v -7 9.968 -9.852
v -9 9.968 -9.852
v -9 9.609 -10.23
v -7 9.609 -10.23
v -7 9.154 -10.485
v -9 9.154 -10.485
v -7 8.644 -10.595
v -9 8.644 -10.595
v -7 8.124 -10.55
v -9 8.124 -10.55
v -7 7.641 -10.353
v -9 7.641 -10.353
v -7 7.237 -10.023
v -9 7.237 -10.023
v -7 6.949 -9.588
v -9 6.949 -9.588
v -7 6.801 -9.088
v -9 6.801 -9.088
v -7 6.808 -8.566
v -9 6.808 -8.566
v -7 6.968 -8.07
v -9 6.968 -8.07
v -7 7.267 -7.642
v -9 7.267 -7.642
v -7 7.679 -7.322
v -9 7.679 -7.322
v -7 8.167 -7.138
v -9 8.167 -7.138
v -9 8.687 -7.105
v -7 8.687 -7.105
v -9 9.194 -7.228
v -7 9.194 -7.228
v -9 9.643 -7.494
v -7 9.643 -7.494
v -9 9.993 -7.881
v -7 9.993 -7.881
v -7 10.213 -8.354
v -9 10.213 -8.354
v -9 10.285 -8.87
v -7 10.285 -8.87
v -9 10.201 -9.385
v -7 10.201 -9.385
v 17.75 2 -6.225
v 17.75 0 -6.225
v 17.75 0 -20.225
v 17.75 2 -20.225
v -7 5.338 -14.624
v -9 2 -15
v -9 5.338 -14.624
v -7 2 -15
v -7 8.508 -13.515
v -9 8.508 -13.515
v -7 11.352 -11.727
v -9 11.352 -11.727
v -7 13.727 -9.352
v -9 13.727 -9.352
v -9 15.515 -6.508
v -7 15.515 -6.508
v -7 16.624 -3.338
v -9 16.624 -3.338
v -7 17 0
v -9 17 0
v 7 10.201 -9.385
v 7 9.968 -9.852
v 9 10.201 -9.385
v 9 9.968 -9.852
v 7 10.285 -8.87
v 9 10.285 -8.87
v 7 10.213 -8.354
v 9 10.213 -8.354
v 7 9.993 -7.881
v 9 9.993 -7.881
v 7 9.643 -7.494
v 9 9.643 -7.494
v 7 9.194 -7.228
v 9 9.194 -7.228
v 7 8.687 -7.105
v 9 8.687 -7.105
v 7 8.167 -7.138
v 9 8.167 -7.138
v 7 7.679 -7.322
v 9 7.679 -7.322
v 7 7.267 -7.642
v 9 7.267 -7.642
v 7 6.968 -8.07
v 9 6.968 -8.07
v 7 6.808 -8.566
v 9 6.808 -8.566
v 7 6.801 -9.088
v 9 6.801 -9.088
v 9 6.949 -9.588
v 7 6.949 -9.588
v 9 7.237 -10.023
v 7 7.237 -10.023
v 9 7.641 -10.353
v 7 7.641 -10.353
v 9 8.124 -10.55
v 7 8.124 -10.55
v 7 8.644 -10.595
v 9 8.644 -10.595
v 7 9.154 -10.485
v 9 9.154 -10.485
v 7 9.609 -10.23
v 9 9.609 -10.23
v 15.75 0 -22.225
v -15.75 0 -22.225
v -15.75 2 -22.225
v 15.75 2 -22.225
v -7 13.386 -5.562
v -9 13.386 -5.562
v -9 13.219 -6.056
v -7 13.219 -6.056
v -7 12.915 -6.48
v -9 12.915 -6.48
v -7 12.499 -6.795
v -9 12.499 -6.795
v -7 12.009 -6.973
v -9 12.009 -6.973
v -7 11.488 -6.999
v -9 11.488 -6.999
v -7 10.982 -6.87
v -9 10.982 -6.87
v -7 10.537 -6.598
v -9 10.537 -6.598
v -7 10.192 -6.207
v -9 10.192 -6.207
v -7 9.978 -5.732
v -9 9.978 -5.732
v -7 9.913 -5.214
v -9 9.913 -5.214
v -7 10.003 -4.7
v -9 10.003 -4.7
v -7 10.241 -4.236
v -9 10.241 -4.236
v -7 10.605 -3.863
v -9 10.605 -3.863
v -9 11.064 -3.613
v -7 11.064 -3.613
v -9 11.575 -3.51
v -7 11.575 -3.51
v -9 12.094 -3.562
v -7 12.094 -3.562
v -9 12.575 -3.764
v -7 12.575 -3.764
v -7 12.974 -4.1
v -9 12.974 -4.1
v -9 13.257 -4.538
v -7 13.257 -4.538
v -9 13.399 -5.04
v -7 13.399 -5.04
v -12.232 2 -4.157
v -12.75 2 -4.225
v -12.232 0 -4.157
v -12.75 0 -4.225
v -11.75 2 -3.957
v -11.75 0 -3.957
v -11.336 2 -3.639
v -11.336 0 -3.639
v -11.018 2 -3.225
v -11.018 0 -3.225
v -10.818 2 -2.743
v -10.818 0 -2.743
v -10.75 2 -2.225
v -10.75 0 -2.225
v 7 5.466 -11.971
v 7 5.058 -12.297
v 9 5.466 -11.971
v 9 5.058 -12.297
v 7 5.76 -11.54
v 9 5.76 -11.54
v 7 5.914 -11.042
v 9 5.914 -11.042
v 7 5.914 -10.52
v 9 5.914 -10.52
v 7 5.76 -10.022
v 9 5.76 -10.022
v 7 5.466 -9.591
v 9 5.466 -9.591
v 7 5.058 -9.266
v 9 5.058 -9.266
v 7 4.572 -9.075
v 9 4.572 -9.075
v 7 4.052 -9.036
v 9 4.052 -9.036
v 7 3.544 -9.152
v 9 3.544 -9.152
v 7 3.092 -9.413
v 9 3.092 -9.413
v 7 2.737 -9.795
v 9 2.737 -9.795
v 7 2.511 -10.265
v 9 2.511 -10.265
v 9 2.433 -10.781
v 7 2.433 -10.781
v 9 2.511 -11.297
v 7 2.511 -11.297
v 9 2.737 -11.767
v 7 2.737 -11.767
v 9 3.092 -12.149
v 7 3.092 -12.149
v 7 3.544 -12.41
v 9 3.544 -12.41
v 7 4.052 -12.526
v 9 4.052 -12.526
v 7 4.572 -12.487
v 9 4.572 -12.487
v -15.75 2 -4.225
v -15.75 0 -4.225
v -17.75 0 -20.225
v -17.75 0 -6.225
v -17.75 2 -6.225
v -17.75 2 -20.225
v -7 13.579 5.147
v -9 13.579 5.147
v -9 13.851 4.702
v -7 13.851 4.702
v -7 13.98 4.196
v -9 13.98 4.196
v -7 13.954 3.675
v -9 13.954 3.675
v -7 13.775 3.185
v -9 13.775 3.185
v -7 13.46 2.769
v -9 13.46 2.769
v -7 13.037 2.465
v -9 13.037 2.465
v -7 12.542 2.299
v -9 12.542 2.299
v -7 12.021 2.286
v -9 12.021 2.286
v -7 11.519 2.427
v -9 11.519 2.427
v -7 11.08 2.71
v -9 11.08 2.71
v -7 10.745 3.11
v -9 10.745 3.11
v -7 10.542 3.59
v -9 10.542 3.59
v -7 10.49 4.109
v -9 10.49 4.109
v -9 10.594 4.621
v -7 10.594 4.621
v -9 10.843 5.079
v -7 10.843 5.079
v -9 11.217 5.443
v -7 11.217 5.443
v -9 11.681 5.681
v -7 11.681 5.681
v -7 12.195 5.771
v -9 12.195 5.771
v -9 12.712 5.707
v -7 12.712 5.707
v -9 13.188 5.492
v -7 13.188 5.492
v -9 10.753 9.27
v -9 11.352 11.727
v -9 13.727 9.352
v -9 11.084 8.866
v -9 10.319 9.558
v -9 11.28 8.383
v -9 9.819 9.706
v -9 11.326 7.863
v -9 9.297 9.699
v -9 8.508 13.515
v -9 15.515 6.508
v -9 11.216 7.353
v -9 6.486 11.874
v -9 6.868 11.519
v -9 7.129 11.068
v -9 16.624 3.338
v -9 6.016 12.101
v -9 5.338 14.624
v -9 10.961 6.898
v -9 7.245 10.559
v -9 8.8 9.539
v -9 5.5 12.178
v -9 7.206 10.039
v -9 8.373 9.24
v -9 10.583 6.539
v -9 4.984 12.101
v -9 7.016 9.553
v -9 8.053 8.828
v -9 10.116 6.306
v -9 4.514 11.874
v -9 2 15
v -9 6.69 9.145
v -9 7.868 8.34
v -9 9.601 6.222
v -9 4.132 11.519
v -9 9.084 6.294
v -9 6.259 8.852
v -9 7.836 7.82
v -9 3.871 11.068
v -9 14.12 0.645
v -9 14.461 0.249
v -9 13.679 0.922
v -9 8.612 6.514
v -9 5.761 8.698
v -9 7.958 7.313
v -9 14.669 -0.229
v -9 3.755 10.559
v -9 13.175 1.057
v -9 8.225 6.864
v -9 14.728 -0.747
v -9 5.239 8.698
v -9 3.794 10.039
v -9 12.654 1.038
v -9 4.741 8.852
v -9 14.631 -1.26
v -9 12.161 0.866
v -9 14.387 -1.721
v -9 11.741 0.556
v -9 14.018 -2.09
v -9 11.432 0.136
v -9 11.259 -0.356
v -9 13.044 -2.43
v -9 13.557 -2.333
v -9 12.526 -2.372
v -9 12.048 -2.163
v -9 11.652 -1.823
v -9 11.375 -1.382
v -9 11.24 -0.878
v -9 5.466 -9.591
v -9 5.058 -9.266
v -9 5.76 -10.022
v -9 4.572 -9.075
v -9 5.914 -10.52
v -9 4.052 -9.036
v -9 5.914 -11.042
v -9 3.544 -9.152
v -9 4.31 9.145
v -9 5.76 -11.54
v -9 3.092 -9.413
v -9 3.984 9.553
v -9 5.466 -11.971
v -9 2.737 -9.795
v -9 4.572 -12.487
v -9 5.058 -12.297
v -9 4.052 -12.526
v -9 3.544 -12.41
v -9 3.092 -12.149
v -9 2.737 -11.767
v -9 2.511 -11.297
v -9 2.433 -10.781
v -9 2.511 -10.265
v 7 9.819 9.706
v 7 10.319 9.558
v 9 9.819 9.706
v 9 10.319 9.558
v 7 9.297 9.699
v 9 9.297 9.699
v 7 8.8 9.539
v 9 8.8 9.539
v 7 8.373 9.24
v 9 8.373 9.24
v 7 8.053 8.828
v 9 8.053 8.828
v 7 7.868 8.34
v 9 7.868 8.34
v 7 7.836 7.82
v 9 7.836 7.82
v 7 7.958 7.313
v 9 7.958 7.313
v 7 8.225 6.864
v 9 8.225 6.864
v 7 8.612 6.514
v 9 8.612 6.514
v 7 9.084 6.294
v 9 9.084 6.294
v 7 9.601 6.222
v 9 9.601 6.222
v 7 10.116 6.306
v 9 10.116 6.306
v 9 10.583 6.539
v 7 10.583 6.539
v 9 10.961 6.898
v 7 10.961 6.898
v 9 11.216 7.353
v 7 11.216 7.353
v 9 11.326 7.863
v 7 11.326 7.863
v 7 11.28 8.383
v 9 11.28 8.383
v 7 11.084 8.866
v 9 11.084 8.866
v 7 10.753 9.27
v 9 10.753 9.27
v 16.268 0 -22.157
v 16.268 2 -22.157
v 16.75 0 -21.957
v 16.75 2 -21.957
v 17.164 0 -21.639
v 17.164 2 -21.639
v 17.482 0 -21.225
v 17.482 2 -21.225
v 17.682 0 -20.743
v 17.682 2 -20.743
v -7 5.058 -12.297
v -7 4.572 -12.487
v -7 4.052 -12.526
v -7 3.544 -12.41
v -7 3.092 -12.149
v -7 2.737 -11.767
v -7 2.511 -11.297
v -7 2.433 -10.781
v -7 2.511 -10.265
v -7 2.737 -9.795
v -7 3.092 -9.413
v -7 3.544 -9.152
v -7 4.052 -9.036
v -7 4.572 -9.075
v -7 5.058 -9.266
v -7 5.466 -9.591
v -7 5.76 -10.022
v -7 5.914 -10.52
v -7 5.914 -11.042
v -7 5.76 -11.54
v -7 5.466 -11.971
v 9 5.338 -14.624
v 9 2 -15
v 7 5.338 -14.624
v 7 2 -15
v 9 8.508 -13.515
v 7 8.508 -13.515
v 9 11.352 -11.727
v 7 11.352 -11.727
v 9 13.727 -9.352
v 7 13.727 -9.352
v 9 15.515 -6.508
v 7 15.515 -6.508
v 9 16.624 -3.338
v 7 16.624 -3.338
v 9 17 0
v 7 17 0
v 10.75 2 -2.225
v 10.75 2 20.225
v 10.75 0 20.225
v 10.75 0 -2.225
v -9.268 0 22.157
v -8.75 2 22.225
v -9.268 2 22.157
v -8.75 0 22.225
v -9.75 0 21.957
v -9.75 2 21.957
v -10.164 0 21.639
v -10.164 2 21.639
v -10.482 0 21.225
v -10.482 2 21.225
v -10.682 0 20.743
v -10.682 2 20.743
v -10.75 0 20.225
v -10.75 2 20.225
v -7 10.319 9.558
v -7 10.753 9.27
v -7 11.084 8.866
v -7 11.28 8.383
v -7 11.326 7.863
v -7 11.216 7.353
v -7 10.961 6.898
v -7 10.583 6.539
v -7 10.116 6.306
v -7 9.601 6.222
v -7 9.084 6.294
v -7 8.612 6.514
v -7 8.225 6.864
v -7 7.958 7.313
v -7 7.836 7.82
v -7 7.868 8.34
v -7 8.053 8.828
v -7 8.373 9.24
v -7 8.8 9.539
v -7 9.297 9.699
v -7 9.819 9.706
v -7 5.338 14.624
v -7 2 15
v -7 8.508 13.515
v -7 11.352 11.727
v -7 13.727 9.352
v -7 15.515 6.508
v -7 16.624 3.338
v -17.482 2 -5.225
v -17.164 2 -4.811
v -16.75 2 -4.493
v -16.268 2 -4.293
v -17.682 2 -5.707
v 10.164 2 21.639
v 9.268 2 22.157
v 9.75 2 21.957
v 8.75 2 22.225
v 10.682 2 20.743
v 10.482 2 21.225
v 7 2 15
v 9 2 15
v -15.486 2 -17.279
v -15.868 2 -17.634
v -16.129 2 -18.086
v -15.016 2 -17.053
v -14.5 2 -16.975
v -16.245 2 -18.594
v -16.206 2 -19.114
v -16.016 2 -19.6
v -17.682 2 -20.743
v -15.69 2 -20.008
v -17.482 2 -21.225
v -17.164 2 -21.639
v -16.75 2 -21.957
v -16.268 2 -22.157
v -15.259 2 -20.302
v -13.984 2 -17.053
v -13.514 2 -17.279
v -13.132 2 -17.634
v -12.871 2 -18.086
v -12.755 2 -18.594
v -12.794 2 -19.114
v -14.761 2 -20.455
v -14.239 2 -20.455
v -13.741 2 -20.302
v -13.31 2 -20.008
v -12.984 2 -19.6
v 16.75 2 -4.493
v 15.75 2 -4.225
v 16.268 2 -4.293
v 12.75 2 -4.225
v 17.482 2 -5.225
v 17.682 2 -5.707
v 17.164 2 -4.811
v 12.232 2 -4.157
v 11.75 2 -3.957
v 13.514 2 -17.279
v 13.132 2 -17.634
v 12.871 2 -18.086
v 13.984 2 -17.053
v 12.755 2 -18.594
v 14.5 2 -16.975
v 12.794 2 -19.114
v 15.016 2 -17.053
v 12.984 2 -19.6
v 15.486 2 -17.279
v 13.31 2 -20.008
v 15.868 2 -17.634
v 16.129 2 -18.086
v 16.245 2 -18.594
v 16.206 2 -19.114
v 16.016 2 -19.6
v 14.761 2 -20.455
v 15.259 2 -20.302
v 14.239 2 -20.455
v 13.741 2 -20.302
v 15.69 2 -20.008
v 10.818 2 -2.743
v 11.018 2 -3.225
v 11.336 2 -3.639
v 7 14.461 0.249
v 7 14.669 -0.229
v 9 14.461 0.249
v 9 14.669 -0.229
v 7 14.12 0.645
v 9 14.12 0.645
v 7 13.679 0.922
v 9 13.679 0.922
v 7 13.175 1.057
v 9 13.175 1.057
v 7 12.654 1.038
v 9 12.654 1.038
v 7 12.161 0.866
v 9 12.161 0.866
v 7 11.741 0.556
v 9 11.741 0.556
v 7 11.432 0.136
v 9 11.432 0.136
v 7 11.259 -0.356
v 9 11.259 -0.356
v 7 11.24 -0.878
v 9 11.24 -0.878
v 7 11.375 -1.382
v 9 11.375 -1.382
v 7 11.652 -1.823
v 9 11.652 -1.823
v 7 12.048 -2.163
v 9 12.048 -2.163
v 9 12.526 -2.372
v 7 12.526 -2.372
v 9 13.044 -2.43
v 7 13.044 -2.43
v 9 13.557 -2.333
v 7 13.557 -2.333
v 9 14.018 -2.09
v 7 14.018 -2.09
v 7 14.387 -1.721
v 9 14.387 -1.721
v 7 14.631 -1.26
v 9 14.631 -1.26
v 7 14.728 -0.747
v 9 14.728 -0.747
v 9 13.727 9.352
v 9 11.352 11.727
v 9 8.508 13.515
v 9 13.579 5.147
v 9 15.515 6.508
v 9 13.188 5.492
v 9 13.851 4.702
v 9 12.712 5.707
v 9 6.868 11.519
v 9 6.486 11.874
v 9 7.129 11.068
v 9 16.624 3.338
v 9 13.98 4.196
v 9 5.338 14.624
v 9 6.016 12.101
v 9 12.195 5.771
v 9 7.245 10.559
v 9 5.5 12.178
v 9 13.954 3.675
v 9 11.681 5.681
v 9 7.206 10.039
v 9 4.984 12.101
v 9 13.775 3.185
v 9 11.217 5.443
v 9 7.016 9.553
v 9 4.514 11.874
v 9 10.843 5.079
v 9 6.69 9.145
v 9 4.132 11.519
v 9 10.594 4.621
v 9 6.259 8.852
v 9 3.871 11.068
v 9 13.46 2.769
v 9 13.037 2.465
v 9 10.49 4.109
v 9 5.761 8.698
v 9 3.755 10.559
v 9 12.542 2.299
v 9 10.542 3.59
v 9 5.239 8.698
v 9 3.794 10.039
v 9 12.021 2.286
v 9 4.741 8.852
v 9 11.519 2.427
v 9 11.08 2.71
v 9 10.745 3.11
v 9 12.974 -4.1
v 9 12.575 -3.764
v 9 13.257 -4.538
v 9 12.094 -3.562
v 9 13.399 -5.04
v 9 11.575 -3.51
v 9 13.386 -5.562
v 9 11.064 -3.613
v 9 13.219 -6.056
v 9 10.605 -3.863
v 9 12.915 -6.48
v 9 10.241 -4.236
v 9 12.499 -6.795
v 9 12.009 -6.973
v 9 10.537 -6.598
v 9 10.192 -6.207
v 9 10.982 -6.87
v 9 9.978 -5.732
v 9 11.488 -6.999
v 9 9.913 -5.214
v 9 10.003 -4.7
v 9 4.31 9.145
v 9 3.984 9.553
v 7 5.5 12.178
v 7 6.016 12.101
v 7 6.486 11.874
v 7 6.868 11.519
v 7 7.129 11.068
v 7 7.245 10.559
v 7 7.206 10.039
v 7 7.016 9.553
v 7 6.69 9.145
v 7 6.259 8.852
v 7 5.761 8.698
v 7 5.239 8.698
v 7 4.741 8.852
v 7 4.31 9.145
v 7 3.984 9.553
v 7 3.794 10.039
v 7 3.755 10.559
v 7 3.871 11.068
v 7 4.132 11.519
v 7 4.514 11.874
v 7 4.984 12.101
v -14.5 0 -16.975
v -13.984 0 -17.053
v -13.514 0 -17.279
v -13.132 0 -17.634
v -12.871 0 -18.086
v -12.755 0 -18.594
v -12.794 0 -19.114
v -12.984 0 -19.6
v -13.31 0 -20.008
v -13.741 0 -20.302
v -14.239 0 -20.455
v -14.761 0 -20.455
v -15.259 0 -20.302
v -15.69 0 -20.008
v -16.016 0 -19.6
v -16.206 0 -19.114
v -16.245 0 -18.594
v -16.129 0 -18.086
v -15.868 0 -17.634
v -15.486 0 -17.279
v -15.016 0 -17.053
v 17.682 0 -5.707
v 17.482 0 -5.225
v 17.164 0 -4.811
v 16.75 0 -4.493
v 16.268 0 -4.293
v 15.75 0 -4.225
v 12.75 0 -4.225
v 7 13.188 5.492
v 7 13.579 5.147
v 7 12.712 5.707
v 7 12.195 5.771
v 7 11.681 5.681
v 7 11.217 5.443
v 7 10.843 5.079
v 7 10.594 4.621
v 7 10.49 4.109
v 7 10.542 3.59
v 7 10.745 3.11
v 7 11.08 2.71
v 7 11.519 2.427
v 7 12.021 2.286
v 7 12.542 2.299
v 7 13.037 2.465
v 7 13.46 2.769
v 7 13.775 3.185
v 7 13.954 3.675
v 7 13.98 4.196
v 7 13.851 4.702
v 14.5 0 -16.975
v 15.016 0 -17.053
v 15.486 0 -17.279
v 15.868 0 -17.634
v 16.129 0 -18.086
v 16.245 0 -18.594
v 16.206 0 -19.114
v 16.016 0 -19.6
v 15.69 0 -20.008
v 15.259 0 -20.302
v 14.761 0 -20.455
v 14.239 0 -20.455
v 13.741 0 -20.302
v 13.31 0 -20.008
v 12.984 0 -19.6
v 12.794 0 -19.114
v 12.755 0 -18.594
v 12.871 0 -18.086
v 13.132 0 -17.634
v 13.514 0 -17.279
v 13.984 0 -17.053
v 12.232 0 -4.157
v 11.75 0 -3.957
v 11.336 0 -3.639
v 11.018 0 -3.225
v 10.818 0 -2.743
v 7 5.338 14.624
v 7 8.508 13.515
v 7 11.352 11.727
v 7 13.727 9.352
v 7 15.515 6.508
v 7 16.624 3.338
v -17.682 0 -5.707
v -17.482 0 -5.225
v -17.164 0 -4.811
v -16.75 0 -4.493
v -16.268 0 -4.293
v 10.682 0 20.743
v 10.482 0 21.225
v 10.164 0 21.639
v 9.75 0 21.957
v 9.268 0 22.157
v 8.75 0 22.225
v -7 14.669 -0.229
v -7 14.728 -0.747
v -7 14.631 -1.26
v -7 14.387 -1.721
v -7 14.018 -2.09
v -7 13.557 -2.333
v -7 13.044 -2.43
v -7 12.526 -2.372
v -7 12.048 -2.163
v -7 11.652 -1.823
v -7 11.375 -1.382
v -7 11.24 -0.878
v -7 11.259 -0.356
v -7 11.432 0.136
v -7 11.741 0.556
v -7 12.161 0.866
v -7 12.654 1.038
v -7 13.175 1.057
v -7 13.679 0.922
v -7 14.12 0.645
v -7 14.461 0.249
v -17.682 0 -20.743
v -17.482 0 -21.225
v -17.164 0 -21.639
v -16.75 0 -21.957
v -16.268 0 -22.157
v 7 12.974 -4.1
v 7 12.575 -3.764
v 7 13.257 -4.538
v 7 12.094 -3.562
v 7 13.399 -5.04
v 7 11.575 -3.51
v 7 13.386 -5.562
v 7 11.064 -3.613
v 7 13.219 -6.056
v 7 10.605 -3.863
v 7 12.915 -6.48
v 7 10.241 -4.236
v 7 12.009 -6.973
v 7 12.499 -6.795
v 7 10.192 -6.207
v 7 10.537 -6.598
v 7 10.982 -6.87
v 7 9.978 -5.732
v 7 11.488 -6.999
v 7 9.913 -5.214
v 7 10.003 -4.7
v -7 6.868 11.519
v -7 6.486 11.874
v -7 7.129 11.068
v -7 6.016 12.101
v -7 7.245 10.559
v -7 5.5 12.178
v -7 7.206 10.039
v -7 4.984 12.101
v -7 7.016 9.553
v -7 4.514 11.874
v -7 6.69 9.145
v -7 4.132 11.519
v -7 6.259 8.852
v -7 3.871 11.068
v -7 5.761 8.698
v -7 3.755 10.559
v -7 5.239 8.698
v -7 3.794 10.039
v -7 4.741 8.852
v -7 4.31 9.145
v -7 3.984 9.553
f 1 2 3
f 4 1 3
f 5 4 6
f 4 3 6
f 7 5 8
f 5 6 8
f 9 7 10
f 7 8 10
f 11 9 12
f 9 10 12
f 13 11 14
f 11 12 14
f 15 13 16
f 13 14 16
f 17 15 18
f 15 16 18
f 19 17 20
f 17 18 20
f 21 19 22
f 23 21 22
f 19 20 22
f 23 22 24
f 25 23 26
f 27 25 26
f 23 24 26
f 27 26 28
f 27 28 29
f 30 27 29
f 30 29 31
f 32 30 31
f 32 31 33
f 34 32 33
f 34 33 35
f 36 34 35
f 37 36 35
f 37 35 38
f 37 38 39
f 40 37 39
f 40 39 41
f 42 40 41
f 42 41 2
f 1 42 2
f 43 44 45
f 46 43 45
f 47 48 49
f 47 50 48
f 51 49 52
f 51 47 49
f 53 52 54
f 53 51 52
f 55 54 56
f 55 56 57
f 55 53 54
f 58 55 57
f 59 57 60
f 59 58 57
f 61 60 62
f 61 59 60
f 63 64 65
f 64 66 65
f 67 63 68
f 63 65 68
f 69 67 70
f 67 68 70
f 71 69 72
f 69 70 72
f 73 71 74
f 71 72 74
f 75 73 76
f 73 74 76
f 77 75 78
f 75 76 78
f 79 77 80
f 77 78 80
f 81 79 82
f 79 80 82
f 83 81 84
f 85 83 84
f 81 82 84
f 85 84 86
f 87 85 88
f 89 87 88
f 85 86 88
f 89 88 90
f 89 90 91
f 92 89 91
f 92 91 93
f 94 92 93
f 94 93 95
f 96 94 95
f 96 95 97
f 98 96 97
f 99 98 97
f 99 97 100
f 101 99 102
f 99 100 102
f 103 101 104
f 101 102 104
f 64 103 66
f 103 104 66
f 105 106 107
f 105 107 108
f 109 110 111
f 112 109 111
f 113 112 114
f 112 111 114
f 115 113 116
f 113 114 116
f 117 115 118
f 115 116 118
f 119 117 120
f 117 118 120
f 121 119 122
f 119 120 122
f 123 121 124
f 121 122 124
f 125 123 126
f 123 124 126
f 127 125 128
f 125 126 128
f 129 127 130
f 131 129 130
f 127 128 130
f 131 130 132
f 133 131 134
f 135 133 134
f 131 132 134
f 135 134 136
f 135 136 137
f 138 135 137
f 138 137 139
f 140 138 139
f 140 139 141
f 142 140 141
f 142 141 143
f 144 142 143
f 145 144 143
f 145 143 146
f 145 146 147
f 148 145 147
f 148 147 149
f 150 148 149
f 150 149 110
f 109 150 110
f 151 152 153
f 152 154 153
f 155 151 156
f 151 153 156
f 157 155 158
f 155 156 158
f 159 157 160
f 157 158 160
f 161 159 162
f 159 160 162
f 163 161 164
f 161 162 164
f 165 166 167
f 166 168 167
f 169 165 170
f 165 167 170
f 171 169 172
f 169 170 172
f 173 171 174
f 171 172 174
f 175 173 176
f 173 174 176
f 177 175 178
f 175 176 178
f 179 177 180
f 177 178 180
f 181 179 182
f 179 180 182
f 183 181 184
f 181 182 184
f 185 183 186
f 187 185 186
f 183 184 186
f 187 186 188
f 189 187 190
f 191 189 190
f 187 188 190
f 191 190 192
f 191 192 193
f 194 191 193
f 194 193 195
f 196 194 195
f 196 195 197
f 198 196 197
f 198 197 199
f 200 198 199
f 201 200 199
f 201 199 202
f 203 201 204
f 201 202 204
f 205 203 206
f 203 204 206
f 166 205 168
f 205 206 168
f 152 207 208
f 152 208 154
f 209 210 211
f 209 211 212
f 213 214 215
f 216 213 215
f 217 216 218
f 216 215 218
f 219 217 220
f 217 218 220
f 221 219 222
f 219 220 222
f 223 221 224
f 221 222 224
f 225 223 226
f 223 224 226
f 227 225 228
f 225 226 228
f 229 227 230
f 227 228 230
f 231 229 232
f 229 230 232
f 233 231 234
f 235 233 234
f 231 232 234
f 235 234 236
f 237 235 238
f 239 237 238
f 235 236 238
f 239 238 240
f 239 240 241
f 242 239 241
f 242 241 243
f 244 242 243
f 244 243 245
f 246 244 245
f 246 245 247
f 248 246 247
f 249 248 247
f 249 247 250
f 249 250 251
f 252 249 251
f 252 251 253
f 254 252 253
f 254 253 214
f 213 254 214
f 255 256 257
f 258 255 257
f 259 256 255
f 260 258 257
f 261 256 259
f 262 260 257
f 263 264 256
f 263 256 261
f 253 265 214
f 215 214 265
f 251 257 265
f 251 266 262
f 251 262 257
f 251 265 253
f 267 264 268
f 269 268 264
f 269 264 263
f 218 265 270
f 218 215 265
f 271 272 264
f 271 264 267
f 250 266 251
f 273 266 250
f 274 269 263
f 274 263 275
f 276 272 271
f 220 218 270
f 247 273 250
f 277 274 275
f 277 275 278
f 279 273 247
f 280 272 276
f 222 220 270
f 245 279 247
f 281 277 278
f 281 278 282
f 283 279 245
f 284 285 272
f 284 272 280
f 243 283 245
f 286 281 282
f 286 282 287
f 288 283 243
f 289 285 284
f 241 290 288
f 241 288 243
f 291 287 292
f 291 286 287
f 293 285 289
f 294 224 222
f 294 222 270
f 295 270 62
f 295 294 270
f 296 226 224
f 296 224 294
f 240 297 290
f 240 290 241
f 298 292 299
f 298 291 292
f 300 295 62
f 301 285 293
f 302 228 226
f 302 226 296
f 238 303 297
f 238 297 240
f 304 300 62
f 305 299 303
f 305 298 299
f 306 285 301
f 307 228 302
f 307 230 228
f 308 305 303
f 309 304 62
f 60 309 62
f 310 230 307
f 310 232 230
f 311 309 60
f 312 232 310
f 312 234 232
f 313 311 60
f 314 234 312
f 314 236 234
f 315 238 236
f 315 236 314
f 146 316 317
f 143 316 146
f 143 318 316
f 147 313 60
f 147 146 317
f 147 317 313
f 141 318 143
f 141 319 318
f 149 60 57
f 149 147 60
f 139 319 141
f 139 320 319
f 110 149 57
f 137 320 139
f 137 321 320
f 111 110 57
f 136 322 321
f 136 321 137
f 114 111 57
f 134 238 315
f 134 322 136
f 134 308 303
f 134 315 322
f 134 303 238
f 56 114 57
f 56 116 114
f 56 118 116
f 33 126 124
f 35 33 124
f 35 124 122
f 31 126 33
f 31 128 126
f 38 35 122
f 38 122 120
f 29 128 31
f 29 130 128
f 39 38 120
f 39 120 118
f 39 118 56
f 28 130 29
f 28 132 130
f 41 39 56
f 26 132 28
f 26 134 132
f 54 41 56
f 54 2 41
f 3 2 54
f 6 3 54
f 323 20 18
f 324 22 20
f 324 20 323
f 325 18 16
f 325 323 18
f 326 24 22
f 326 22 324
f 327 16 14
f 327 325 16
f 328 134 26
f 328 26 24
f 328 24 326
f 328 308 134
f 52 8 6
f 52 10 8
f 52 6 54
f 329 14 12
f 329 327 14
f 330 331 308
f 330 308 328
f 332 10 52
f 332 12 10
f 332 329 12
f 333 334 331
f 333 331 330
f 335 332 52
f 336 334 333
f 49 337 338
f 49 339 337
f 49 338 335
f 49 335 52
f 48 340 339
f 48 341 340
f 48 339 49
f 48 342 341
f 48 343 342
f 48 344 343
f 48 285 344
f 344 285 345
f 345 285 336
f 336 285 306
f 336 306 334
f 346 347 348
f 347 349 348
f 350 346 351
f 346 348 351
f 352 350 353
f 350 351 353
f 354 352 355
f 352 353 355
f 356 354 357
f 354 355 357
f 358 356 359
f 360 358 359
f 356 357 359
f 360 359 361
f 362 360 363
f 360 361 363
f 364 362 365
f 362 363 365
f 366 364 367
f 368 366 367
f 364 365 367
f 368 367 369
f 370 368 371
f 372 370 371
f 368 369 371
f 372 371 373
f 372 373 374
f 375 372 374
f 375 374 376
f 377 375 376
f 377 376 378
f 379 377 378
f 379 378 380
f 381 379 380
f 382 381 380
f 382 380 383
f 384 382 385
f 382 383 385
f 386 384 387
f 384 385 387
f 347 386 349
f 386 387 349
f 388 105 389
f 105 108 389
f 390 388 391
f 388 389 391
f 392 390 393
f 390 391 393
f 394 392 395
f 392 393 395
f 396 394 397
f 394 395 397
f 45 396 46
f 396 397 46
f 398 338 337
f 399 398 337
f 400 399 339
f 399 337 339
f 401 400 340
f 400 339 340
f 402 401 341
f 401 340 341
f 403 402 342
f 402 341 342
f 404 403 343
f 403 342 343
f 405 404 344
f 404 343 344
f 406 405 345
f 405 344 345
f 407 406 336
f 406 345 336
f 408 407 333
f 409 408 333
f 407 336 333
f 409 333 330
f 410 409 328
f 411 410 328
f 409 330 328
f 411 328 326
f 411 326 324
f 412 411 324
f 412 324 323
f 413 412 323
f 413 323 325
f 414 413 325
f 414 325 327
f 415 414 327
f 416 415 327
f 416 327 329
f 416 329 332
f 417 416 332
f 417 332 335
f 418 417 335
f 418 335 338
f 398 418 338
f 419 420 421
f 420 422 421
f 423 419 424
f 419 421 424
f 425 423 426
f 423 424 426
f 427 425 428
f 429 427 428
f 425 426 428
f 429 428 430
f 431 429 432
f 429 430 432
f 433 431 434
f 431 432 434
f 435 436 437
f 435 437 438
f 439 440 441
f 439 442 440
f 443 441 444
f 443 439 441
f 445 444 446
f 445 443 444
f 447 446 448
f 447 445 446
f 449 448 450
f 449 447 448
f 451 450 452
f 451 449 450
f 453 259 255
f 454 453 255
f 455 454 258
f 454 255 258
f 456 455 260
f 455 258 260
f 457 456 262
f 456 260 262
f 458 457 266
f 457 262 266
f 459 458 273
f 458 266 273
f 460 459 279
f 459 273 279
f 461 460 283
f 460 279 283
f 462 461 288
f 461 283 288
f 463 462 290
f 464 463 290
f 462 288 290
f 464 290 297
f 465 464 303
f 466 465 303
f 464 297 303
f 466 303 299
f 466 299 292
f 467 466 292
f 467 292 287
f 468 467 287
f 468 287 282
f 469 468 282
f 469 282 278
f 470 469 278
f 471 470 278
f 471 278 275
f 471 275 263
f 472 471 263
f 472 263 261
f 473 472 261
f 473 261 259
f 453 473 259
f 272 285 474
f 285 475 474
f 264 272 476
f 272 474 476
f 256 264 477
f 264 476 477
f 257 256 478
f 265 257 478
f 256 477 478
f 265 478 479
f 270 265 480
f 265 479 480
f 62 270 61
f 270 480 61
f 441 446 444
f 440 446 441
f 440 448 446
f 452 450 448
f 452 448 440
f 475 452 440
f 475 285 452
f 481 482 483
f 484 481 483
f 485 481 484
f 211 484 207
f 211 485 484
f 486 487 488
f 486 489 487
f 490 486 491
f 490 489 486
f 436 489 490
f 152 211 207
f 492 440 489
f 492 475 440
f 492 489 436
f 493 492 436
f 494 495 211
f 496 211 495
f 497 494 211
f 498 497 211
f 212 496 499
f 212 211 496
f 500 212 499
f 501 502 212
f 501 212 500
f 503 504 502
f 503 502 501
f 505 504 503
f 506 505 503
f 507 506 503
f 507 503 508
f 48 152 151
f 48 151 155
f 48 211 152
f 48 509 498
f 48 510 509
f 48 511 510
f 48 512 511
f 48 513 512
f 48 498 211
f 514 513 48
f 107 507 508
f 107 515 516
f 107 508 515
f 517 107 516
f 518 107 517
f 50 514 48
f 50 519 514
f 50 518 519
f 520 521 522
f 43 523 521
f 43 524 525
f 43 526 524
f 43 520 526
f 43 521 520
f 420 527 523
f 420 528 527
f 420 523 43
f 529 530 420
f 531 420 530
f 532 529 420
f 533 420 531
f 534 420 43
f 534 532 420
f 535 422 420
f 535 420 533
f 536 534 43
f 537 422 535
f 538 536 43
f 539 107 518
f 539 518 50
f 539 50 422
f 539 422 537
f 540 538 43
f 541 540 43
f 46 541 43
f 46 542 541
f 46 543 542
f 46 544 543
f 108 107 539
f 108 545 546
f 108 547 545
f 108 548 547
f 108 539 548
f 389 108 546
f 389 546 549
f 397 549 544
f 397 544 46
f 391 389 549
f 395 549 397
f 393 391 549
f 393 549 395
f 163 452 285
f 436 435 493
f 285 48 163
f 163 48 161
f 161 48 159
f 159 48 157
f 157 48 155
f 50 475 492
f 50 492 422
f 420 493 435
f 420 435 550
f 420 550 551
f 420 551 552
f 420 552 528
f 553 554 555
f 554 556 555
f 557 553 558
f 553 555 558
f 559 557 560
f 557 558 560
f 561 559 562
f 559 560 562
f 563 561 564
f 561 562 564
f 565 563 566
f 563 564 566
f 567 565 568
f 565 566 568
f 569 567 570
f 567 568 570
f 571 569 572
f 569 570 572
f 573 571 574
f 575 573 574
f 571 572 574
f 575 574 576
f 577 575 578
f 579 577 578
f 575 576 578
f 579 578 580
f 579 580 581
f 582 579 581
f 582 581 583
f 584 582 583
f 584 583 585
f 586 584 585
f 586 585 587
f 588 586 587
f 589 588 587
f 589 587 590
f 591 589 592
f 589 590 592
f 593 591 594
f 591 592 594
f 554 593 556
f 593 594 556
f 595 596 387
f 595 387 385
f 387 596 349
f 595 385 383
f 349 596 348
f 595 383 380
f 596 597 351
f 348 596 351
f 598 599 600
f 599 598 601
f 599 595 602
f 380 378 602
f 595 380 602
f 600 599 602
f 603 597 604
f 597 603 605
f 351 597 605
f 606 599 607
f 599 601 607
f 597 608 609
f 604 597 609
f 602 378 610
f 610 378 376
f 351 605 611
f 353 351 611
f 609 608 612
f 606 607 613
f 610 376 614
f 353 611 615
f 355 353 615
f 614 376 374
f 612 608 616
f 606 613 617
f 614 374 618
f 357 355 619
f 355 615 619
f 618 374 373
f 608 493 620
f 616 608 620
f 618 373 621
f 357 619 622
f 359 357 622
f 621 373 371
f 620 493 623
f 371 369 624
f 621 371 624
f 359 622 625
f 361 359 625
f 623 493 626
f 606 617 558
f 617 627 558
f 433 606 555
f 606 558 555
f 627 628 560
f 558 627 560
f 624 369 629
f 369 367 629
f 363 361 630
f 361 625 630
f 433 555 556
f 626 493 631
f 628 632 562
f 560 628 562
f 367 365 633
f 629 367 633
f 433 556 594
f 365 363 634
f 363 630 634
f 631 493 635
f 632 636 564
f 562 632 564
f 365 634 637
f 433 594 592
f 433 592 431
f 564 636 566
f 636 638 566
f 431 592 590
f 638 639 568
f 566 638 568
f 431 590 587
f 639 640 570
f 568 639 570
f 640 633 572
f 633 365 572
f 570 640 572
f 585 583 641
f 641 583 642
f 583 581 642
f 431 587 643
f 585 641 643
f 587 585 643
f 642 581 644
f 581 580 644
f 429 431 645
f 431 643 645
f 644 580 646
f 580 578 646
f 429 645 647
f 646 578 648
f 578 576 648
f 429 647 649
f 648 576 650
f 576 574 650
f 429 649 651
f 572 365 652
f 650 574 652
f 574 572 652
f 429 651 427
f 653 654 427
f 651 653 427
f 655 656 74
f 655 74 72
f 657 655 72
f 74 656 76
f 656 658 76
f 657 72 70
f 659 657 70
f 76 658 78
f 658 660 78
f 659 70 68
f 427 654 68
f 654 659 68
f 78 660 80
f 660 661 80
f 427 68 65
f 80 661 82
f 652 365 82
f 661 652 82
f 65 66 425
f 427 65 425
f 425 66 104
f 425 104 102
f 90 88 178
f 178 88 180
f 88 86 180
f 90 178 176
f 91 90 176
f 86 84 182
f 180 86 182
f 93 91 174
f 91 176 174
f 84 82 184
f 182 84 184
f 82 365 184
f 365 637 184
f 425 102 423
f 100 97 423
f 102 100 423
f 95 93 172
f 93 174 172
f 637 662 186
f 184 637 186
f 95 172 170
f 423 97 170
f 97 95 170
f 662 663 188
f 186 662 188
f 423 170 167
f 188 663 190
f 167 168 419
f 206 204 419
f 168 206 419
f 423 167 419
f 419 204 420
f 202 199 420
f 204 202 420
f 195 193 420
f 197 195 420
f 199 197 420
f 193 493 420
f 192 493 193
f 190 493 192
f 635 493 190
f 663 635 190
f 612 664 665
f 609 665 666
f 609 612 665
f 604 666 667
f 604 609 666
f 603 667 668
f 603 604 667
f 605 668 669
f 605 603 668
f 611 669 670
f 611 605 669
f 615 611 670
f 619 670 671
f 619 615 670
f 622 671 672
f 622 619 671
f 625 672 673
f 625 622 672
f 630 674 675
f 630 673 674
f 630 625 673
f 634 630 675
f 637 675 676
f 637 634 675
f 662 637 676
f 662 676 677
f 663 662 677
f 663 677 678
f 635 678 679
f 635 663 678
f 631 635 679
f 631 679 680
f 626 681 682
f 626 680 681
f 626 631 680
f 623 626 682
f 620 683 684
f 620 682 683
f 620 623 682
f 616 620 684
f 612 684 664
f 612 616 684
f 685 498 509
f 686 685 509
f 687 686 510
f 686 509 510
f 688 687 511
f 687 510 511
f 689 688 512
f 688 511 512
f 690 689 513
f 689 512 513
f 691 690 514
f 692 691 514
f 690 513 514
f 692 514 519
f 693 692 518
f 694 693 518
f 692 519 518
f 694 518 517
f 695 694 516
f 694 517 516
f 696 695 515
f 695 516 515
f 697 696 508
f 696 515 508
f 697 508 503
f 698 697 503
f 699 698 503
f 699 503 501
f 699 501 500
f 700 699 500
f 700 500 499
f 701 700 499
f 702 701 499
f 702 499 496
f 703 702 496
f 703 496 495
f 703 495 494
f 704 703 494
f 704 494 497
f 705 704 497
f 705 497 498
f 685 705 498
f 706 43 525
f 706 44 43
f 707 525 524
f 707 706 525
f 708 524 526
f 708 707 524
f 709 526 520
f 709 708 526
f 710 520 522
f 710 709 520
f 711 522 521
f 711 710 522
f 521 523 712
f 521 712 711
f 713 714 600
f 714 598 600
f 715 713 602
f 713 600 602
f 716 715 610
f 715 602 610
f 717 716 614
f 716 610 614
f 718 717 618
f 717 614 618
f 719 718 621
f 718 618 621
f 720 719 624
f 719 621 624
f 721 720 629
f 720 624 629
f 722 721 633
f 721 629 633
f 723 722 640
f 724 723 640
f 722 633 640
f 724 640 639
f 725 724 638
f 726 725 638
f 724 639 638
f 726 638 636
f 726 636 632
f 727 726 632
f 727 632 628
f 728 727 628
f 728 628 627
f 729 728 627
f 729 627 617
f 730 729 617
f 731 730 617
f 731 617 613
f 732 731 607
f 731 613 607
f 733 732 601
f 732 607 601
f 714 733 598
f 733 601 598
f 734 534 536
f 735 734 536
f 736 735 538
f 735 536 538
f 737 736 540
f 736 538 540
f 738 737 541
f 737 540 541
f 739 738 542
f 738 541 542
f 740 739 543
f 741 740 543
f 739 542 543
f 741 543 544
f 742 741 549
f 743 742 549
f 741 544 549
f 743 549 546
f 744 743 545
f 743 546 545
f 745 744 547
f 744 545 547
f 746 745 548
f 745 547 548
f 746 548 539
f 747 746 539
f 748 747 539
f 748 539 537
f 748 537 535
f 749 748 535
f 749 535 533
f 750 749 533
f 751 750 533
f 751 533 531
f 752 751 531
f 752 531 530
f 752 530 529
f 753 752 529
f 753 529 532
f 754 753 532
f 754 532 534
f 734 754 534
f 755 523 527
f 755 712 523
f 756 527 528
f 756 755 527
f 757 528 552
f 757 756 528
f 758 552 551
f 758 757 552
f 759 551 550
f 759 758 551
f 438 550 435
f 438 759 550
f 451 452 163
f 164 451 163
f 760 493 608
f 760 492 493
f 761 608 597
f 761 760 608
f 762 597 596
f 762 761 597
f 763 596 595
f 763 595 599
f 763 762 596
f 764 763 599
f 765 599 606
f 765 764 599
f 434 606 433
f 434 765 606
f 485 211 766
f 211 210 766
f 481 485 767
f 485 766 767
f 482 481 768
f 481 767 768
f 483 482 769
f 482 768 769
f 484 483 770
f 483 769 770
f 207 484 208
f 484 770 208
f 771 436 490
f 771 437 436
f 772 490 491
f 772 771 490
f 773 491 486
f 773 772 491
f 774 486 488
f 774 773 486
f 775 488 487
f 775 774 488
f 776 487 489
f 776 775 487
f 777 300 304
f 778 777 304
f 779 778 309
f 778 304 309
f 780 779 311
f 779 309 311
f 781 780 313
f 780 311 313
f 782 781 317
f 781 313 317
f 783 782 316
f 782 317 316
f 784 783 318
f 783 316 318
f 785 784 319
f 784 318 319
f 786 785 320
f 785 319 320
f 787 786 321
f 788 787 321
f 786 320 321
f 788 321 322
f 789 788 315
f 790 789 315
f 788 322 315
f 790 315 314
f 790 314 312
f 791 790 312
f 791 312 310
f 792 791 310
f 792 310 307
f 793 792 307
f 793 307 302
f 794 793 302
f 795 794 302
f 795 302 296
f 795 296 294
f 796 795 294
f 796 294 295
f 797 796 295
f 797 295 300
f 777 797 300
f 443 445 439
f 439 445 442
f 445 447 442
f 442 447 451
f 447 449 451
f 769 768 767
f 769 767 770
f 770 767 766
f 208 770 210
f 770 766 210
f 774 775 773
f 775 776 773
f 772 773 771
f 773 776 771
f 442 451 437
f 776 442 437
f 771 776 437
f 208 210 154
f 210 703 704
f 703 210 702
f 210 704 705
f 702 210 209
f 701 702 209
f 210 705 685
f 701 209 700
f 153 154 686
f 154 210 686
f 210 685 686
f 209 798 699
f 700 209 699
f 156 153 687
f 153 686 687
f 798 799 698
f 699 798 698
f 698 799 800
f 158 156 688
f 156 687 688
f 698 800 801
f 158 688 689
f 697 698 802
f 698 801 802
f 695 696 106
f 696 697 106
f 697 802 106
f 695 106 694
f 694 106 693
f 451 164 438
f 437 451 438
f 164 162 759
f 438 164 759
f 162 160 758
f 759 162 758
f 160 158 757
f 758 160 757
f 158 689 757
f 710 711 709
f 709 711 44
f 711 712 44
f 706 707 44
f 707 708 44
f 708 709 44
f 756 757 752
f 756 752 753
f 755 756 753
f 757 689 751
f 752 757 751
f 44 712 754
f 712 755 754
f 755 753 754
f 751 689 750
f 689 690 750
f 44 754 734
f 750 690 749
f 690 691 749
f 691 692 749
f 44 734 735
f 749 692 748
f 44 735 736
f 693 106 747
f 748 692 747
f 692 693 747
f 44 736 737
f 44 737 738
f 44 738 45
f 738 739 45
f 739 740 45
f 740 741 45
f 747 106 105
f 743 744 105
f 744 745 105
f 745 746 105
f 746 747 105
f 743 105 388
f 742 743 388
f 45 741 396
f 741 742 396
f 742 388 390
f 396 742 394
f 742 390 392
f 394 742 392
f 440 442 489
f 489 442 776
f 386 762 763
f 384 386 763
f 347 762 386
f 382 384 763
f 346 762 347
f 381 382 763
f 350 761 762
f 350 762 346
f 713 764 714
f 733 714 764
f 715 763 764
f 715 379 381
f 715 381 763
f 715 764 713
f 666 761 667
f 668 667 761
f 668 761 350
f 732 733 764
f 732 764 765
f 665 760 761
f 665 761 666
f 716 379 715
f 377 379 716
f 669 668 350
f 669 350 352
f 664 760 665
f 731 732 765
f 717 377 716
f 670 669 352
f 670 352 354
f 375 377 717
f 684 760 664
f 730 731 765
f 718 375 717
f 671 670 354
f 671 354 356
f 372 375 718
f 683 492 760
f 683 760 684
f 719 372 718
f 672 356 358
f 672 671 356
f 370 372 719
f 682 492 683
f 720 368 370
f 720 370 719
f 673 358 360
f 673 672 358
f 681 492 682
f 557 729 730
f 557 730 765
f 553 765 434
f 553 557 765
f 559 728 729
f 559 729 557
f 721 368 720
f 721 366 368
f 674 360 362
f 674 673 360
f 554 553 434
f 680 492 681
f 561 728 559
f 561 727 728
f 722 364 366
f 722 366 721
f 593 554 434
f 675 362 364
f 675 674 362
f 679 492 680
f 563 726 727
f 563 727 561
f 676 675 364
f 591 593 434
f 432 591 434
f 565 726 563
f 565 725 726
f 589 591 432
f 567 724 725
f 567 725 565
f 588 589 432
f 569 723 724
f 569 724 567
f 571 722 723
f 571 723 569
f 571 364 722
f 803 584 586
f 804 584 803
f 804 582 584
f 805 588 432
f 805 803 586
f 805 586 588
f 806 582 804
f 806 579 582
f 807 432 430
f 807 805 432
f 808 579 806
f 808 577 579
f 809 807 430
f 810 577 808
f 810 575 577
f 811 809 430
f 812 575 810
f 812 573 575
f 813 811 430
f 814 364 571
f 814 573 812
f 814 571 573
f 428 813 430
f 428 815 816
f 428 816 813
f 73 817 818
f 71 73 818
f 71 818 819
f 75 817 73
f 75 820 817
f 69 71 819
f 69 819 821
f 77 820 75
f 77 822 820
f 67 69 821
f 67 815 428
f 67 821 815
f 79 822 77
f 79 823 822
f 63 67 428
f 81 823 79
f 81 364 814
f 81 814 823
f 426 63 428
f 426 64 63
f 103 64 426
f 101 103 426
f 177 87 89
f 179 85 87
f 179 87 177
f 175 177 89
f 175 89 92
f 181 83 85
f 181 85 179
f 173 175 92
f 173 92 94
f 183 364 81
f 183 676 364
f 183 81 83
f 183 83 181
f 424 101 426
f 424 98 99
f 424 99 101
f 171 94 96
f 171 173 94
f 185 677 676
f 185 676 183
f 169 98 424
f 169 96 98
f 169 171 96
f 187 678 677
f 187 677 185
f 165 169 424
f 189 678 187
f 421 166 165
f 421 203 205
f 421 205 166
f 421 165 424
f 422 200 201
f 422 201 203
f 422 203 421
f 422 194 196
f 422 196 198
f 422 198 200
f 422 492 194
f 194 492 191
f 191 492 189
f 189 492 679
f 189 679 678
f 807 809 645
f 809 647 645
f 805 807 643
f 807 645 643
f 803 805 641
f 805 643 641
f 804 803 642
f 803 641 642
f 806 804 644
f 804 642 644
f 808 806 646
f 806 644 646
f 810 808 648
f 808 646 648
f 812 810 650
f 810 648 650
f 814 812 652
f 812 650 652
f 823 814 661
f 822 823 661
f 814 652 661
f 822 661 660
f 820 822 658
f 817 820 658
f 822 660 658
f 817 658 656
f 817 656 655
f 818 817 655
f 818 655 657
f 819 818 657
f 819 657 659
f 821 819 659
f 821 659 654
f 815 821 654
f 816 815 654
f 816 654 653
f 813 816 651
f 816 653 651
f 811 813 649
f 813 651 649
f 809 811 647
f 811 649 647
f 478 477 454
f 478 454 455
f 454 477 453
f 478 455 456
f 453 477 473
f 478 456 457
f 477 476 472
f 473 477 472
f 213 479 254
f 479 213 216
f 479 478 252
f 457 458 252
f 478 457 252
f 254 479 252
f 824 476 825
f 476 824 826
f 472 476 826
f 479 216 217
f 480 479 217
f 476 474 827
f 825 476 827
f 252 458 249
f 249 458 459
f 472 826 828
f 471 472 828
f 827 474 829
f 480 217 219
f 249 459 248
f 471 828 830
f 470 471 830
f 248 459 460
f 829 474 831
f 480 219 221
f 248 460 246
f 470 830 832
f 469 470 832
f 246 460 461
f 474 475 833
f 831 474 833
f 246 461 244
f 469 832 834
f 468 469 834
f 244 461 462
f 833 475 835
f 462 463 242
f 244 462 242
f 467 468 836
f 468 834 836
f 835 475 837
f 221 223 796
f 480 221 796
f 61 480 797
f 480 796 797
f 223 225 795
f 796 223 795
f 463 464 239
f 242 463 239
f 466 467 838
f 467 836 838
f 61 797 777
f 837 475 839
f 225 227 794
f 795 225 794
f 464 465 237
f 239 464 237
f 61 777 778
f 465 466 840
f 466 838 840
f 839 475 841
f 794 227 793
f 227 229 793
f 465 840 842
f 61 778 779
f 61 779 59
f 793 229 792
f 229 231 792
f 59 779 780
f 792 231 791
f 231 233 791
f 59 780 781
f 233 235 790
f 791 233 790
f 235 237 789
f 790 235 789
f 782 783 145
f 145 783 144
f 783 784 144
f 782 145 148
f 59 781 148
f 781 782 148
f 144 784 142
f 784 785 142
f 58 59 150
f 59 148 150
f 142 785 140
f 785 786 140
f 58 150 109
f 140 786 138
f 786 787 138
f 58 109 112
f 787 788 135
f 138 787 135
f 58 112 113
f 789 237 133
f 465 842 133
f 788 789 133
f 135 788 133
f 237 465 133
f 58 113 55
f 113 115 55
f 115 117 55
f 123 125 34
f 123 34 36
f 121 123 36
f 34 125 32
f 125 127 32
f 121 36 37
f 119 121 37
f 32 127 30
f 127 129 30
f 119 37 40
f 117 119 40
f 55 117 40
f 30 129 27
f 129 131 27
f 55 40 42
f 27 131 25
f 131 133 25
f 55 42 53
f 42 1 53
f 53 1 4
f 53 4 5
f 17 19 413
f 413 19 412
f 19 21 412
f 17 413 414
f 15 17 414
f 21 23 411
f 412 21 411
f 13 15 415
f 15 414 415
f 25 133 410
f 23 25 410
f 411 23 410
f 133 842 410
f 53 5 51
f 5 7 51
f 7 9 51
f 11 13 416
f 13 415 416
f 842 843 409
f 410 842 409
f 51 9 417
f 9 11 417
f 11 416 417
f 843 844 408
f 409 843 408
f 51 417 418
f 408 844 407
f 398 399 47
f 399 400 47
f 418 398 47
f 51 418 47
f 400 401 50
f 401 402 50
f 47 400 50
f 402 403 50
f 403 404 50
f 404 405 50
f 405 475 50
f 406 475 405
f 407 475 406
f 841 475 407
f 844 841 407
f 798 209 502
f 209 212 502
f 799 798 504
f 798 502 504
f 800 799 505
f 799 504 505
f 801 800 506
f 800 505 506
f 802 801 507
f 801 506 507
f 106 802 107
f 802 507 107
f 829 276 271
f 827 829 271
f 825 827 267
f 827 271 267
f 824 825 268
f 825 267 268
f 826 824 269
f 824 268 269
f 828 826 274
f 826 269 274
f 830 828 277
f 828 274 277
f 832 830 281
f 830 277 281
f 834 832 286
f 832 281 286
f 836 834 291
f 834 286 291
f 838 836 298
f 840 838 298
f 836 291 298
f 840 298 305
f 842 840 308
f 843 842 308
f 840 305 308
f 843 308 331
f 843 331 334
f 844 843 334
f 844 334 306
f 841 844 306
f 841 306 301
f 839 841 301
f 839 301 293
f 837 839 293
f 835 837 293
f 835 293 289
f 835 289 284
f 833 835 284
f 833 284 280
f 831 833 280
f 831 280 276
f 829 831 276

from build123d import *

# Parameters (mm, degrees)
SKETCH1_W               = 35.5
SKETCH1_H               = 44.45
BOSS_EXTRUDE1_DEPTH     = 2
SKETCH2_R               = 1.75
CUT_EXTRUDE1_DEPTH      = 29.513385015
SKETCH3_W               = 7
SKETCH3_H               = 26.45
CUT_EXTRUDE2_DEPTH      = 29.513385015
FILLET1_R               = 2
SKETCH4_W               = 2
SKETCH4_H               = 30
BOSS_EXTRUDE3_DEPTH     = 15
FILLET2_R               = 15
SKETCH5_R               = 1.75
CUT_EXTRUDE3_DEPTH      = 39.710633229
CIRPATTERN1_COUNT       = 7
CIRPATTERN1_ANGLE       = 150
MIRROR1_COPY_1_SKETCH_R = 1.75
MIRROR1_COPY_1_DEPTH    = 39.710633229
MIRROR1_COPY_2_SKETCH_R = 1.75
MIRROR1_COPY_2_DEPTH    = 39.710633229
MIRROR1_COPY_3_SKETCH_R = 1.75
MIRROR1_COPY_3_DEPTH    = 39.710633229
MIRROR1_COPY_4_SKETCH_R = 1.75
MIRROR1_COPY_4_DEPTH    = 39.710633229
MIRROR1_COPY_5_SKETCH_R = 1.75
MIRROR1_COPY_5_DEPTH    = 39.710633229
MIRROR1_COPY_6_SKETCH_R = 1.75
MIRROR1_COPY_6_DEPTH    = 39.710633229
FILLET2_OF_MIRROR1_R    = 15


with BuildPart() as part:
    # Sketch1 → Boss-Extrude1 (new body)
    with BuildSketch(Plane(origin=(0, 0, 0), x_dir=(1, 0, 0), z_dir=(0, 1, 0))):
        Rectangle(SKETCH1_W, SKETCH1_H)
    extrude(amount=BOSS_EXTRUDE1_DEPTH)

    # Sketch2 → Cut-Extrude1 (cut, through all)
    with BuildSketch(Plane(origin=(0, 2, 0), x_dir=(1, 0, 0), z_dir=(0, 1, 0))):
        with Locations(Location((-14.5, 18.725, 0), (0, 0, 270))):
            Circle(SKETCH2_R)
        with Locations(Location((14.5, 18.725, 0), (0, 0, 270))):
            Circle(SKETCH2_R)
    extrude(amount=-CUT_EXTRUDE1_DEPTH, mode=Mode.SUBTRACT)

    # Sketch3 → Cut-Extrude2 (cut, through all)
    with BuildSketch(Plane(origin=(0, 2, 0), x_dir=(1, 0, 0), z_dir=(0, 1, 0))):
        with Locations((-14.25, -9)):
            Rectangle(SKETCH3_W, SKETCH3_H)
        with Locations((14.25, -9)):
            Rectangle(SKETCH3_W, SKETCH3_H)
    extrude(amount=-CUT_EXTRUDE2_DEPTH, mode=Mode.SUBTRACT)

    # Fillet1
    fillet1_edges = [part.edges().sort_by_distance(p)[0] for p in [
        (-17.75, 1, -4.225),
        (-10.75, 1, -4.225),
        (-10.75, 1, 22.225),
        (17.75, 1, -4.225),
        (10.75, 1, 22.225),
        (10.75, 1, -4.225),
        (-17.75, 1, -22.225),
        (17.75, 1, -22.225),
    ]]
    fillet(fillet1_edges, radius=FILLET1_R)

    # Sketch4 → Boss-Extrude3 (add)
    with BuildSketch(Plane(origin=(0, 2, 0), x_dir=(1, 0, 0), z_dir=(0, 1, 0))):
        with Locations((-8, 0)):
            Rectangle(SKETCH4_W, SKETCH4_H)
    boss_extrude3 = extrude(amount=BOSS_EXTRUDE3_DEPTH)

    # Fillet2
    fillet2_edges = [part.edges().sort_by_distance(p)[0] for p in [
        (-8, 17, 15),
        (-8, 17, -15),
    ]]
    fillet(fillet2_edges, radius=FILLET2_R - 0.0001)  # a hair under: the kernel refuses the full size

    # Sketch5 → Cut-Extrude3 (cut, through all)
    with BuildSketch(Plane.ZY.offset(9)):
        with Locations((10.428326807, 5.5)):
            Circle(SKETCH5_R)
    cut_extrude3 = extrude(amount=-CUT_EXTRUDE3_DEPTH, mode=Mode.SUBTRACT)

    # CirPattern1: Cut-Extrude3 ×7 about axis
    cirpattern1_axis = Axis((0, 2, 0), (-1, 0, 0))
    for i in range(1, CIRPATTERN1_COUNT):
        add(cut_extrude3.rotate(cirpattern1_axis, i * CIRPATTERN1_ANGLE / (CIRPATTERN1_COUNT - 1)), mode=Mode.SUBTRACT)

    # Mirror1: Boss-Extrude3, Cut-Extrude3 across plane
    add(boss_extrude3.mirror(Plane(origin=(0, 0, 0), x_dir=(0, 0, 1), z_dir=(1, 0, 0))))
    add(cut_extrude3.mirror(Plane(origin=(0, 0, 0), x_dir=(0, 0, 1), z_dir=(1, 0, 0))), mode=Mode.SUBTRACT)

    # Mirror1 copy 1 sketch → Mirror1 copy 1 (cut, through all)
    with BuildSketch(Plane(origin=(9, 0.187384426, 0.845236523), x_dir=(0, 0.42261826174070033, 0.9063077870366495), z_dir=(1, 0, 0))):
        with Locations((10.428326807, -5.5)):
            Circle(MIRROR1_COPY_1_SKETCH_R)
    extrude(amount=-MIRROR1_COPY_1_DEPTH, mode=Mode.SUBTRACT)

    # Mirror1 copy 2 sketch → Mirror1 copy 2 (cut, through all)
    with BuildSketch(Plane(origin=(9, 0.714424781, 1.532088886), x_dir=(0, 0.7660444431189793, 0.6427876096865378), z_dir=(1, 0, 0))):
        with Locations((10.428326807, -5.5)):
            Circle(MIRROR1_COPY_2_SKETCH_R)
    extrude(amount=-MIRROR1_COPY_2_DEPTH, mode=Mode.SUBTRACT)

    # Mirror1 copy 3 sketch → Mirror1 copy 3 (cut, through all)
    with BuildSketch(Plane(origin=(9, 1.48236191, 1.931851653), x_dir=(0, 0.9659258262890691, 0.25881904510251796), z_dir=(1, 0, 0))):
        with Locations((10.428326807, -5.5)):
            Circle(MIRROR1_COPY_3_SKETCH_R)
    extrude(amount=-MIRROR1_COPY_3_DEPTH, mode=Mode.SUBTRACT)

    # Mirror1 copy 4 sketch → Mirror1 copy 4 (cut, through all)
    with BuildSketch(Plane(origin=(9, 2.347296355, 1.969615506), x_dir=(0, 0.9848077530122074, -0.17364817766693424), z_dir=(1, 0, 0))):
        with Locations((10.428326807, -5.5)):
            Circle(MIRROR1_COPY_4_SKETCH_R)
    extrude(amount=-MIRROR1_COPY_4_DEPTH, mode=Mode.SUBTRACT)

    # Mirror1 copy 5 sketch → Mirror1 copy 5 (cut, through all)
    with BuildSketch(Plane(origin=(9, 3.147152873, 1.638304089), x_dir=(0, 0.8191520442889889, -0.5735764363510502), z_dir=(1, 0, 0))):
        with Locations((10.428326807, -5.5)):
            Circle(MIRROR1_COPY_5_SKETCH_R)
    extrude(amount=-MIRROR1_COPY_5_DEPTH, mode=Mode.SUBTRACT)

    # Mirror1 copy 6 sketch → Mirror1 copy 6 (cut, through all)
    with BuildSketch(Plane(origin=(9, 3.732050808, 1), x_dir=(0, 0.49999999999999495, -0.8660254037844416), z_dir=(1, 0, 0))):
        with Locations((10.428326807, -5.5)):
            Circle(MIRROR1_COPY_6_SKETCH_R)
    extrude(amount=-MIRROR1_COPY_6_DEPTH, mode=Mode.SUBTRACT)

    # Fillet2 of Mirror1
    fillet2_of_mirror1_edges = [part.edges().sort_by_distance(p)[0] for p in [
        (8, 17, 15),
        (8, 17, -15),
    ]]
    fillet(fillet2_of_mirror1_edges, radius=FILLET2_OF_MIRROR1_R - 0.0001)  # a hair under: the kernel refuses the full size


solid = part.part
